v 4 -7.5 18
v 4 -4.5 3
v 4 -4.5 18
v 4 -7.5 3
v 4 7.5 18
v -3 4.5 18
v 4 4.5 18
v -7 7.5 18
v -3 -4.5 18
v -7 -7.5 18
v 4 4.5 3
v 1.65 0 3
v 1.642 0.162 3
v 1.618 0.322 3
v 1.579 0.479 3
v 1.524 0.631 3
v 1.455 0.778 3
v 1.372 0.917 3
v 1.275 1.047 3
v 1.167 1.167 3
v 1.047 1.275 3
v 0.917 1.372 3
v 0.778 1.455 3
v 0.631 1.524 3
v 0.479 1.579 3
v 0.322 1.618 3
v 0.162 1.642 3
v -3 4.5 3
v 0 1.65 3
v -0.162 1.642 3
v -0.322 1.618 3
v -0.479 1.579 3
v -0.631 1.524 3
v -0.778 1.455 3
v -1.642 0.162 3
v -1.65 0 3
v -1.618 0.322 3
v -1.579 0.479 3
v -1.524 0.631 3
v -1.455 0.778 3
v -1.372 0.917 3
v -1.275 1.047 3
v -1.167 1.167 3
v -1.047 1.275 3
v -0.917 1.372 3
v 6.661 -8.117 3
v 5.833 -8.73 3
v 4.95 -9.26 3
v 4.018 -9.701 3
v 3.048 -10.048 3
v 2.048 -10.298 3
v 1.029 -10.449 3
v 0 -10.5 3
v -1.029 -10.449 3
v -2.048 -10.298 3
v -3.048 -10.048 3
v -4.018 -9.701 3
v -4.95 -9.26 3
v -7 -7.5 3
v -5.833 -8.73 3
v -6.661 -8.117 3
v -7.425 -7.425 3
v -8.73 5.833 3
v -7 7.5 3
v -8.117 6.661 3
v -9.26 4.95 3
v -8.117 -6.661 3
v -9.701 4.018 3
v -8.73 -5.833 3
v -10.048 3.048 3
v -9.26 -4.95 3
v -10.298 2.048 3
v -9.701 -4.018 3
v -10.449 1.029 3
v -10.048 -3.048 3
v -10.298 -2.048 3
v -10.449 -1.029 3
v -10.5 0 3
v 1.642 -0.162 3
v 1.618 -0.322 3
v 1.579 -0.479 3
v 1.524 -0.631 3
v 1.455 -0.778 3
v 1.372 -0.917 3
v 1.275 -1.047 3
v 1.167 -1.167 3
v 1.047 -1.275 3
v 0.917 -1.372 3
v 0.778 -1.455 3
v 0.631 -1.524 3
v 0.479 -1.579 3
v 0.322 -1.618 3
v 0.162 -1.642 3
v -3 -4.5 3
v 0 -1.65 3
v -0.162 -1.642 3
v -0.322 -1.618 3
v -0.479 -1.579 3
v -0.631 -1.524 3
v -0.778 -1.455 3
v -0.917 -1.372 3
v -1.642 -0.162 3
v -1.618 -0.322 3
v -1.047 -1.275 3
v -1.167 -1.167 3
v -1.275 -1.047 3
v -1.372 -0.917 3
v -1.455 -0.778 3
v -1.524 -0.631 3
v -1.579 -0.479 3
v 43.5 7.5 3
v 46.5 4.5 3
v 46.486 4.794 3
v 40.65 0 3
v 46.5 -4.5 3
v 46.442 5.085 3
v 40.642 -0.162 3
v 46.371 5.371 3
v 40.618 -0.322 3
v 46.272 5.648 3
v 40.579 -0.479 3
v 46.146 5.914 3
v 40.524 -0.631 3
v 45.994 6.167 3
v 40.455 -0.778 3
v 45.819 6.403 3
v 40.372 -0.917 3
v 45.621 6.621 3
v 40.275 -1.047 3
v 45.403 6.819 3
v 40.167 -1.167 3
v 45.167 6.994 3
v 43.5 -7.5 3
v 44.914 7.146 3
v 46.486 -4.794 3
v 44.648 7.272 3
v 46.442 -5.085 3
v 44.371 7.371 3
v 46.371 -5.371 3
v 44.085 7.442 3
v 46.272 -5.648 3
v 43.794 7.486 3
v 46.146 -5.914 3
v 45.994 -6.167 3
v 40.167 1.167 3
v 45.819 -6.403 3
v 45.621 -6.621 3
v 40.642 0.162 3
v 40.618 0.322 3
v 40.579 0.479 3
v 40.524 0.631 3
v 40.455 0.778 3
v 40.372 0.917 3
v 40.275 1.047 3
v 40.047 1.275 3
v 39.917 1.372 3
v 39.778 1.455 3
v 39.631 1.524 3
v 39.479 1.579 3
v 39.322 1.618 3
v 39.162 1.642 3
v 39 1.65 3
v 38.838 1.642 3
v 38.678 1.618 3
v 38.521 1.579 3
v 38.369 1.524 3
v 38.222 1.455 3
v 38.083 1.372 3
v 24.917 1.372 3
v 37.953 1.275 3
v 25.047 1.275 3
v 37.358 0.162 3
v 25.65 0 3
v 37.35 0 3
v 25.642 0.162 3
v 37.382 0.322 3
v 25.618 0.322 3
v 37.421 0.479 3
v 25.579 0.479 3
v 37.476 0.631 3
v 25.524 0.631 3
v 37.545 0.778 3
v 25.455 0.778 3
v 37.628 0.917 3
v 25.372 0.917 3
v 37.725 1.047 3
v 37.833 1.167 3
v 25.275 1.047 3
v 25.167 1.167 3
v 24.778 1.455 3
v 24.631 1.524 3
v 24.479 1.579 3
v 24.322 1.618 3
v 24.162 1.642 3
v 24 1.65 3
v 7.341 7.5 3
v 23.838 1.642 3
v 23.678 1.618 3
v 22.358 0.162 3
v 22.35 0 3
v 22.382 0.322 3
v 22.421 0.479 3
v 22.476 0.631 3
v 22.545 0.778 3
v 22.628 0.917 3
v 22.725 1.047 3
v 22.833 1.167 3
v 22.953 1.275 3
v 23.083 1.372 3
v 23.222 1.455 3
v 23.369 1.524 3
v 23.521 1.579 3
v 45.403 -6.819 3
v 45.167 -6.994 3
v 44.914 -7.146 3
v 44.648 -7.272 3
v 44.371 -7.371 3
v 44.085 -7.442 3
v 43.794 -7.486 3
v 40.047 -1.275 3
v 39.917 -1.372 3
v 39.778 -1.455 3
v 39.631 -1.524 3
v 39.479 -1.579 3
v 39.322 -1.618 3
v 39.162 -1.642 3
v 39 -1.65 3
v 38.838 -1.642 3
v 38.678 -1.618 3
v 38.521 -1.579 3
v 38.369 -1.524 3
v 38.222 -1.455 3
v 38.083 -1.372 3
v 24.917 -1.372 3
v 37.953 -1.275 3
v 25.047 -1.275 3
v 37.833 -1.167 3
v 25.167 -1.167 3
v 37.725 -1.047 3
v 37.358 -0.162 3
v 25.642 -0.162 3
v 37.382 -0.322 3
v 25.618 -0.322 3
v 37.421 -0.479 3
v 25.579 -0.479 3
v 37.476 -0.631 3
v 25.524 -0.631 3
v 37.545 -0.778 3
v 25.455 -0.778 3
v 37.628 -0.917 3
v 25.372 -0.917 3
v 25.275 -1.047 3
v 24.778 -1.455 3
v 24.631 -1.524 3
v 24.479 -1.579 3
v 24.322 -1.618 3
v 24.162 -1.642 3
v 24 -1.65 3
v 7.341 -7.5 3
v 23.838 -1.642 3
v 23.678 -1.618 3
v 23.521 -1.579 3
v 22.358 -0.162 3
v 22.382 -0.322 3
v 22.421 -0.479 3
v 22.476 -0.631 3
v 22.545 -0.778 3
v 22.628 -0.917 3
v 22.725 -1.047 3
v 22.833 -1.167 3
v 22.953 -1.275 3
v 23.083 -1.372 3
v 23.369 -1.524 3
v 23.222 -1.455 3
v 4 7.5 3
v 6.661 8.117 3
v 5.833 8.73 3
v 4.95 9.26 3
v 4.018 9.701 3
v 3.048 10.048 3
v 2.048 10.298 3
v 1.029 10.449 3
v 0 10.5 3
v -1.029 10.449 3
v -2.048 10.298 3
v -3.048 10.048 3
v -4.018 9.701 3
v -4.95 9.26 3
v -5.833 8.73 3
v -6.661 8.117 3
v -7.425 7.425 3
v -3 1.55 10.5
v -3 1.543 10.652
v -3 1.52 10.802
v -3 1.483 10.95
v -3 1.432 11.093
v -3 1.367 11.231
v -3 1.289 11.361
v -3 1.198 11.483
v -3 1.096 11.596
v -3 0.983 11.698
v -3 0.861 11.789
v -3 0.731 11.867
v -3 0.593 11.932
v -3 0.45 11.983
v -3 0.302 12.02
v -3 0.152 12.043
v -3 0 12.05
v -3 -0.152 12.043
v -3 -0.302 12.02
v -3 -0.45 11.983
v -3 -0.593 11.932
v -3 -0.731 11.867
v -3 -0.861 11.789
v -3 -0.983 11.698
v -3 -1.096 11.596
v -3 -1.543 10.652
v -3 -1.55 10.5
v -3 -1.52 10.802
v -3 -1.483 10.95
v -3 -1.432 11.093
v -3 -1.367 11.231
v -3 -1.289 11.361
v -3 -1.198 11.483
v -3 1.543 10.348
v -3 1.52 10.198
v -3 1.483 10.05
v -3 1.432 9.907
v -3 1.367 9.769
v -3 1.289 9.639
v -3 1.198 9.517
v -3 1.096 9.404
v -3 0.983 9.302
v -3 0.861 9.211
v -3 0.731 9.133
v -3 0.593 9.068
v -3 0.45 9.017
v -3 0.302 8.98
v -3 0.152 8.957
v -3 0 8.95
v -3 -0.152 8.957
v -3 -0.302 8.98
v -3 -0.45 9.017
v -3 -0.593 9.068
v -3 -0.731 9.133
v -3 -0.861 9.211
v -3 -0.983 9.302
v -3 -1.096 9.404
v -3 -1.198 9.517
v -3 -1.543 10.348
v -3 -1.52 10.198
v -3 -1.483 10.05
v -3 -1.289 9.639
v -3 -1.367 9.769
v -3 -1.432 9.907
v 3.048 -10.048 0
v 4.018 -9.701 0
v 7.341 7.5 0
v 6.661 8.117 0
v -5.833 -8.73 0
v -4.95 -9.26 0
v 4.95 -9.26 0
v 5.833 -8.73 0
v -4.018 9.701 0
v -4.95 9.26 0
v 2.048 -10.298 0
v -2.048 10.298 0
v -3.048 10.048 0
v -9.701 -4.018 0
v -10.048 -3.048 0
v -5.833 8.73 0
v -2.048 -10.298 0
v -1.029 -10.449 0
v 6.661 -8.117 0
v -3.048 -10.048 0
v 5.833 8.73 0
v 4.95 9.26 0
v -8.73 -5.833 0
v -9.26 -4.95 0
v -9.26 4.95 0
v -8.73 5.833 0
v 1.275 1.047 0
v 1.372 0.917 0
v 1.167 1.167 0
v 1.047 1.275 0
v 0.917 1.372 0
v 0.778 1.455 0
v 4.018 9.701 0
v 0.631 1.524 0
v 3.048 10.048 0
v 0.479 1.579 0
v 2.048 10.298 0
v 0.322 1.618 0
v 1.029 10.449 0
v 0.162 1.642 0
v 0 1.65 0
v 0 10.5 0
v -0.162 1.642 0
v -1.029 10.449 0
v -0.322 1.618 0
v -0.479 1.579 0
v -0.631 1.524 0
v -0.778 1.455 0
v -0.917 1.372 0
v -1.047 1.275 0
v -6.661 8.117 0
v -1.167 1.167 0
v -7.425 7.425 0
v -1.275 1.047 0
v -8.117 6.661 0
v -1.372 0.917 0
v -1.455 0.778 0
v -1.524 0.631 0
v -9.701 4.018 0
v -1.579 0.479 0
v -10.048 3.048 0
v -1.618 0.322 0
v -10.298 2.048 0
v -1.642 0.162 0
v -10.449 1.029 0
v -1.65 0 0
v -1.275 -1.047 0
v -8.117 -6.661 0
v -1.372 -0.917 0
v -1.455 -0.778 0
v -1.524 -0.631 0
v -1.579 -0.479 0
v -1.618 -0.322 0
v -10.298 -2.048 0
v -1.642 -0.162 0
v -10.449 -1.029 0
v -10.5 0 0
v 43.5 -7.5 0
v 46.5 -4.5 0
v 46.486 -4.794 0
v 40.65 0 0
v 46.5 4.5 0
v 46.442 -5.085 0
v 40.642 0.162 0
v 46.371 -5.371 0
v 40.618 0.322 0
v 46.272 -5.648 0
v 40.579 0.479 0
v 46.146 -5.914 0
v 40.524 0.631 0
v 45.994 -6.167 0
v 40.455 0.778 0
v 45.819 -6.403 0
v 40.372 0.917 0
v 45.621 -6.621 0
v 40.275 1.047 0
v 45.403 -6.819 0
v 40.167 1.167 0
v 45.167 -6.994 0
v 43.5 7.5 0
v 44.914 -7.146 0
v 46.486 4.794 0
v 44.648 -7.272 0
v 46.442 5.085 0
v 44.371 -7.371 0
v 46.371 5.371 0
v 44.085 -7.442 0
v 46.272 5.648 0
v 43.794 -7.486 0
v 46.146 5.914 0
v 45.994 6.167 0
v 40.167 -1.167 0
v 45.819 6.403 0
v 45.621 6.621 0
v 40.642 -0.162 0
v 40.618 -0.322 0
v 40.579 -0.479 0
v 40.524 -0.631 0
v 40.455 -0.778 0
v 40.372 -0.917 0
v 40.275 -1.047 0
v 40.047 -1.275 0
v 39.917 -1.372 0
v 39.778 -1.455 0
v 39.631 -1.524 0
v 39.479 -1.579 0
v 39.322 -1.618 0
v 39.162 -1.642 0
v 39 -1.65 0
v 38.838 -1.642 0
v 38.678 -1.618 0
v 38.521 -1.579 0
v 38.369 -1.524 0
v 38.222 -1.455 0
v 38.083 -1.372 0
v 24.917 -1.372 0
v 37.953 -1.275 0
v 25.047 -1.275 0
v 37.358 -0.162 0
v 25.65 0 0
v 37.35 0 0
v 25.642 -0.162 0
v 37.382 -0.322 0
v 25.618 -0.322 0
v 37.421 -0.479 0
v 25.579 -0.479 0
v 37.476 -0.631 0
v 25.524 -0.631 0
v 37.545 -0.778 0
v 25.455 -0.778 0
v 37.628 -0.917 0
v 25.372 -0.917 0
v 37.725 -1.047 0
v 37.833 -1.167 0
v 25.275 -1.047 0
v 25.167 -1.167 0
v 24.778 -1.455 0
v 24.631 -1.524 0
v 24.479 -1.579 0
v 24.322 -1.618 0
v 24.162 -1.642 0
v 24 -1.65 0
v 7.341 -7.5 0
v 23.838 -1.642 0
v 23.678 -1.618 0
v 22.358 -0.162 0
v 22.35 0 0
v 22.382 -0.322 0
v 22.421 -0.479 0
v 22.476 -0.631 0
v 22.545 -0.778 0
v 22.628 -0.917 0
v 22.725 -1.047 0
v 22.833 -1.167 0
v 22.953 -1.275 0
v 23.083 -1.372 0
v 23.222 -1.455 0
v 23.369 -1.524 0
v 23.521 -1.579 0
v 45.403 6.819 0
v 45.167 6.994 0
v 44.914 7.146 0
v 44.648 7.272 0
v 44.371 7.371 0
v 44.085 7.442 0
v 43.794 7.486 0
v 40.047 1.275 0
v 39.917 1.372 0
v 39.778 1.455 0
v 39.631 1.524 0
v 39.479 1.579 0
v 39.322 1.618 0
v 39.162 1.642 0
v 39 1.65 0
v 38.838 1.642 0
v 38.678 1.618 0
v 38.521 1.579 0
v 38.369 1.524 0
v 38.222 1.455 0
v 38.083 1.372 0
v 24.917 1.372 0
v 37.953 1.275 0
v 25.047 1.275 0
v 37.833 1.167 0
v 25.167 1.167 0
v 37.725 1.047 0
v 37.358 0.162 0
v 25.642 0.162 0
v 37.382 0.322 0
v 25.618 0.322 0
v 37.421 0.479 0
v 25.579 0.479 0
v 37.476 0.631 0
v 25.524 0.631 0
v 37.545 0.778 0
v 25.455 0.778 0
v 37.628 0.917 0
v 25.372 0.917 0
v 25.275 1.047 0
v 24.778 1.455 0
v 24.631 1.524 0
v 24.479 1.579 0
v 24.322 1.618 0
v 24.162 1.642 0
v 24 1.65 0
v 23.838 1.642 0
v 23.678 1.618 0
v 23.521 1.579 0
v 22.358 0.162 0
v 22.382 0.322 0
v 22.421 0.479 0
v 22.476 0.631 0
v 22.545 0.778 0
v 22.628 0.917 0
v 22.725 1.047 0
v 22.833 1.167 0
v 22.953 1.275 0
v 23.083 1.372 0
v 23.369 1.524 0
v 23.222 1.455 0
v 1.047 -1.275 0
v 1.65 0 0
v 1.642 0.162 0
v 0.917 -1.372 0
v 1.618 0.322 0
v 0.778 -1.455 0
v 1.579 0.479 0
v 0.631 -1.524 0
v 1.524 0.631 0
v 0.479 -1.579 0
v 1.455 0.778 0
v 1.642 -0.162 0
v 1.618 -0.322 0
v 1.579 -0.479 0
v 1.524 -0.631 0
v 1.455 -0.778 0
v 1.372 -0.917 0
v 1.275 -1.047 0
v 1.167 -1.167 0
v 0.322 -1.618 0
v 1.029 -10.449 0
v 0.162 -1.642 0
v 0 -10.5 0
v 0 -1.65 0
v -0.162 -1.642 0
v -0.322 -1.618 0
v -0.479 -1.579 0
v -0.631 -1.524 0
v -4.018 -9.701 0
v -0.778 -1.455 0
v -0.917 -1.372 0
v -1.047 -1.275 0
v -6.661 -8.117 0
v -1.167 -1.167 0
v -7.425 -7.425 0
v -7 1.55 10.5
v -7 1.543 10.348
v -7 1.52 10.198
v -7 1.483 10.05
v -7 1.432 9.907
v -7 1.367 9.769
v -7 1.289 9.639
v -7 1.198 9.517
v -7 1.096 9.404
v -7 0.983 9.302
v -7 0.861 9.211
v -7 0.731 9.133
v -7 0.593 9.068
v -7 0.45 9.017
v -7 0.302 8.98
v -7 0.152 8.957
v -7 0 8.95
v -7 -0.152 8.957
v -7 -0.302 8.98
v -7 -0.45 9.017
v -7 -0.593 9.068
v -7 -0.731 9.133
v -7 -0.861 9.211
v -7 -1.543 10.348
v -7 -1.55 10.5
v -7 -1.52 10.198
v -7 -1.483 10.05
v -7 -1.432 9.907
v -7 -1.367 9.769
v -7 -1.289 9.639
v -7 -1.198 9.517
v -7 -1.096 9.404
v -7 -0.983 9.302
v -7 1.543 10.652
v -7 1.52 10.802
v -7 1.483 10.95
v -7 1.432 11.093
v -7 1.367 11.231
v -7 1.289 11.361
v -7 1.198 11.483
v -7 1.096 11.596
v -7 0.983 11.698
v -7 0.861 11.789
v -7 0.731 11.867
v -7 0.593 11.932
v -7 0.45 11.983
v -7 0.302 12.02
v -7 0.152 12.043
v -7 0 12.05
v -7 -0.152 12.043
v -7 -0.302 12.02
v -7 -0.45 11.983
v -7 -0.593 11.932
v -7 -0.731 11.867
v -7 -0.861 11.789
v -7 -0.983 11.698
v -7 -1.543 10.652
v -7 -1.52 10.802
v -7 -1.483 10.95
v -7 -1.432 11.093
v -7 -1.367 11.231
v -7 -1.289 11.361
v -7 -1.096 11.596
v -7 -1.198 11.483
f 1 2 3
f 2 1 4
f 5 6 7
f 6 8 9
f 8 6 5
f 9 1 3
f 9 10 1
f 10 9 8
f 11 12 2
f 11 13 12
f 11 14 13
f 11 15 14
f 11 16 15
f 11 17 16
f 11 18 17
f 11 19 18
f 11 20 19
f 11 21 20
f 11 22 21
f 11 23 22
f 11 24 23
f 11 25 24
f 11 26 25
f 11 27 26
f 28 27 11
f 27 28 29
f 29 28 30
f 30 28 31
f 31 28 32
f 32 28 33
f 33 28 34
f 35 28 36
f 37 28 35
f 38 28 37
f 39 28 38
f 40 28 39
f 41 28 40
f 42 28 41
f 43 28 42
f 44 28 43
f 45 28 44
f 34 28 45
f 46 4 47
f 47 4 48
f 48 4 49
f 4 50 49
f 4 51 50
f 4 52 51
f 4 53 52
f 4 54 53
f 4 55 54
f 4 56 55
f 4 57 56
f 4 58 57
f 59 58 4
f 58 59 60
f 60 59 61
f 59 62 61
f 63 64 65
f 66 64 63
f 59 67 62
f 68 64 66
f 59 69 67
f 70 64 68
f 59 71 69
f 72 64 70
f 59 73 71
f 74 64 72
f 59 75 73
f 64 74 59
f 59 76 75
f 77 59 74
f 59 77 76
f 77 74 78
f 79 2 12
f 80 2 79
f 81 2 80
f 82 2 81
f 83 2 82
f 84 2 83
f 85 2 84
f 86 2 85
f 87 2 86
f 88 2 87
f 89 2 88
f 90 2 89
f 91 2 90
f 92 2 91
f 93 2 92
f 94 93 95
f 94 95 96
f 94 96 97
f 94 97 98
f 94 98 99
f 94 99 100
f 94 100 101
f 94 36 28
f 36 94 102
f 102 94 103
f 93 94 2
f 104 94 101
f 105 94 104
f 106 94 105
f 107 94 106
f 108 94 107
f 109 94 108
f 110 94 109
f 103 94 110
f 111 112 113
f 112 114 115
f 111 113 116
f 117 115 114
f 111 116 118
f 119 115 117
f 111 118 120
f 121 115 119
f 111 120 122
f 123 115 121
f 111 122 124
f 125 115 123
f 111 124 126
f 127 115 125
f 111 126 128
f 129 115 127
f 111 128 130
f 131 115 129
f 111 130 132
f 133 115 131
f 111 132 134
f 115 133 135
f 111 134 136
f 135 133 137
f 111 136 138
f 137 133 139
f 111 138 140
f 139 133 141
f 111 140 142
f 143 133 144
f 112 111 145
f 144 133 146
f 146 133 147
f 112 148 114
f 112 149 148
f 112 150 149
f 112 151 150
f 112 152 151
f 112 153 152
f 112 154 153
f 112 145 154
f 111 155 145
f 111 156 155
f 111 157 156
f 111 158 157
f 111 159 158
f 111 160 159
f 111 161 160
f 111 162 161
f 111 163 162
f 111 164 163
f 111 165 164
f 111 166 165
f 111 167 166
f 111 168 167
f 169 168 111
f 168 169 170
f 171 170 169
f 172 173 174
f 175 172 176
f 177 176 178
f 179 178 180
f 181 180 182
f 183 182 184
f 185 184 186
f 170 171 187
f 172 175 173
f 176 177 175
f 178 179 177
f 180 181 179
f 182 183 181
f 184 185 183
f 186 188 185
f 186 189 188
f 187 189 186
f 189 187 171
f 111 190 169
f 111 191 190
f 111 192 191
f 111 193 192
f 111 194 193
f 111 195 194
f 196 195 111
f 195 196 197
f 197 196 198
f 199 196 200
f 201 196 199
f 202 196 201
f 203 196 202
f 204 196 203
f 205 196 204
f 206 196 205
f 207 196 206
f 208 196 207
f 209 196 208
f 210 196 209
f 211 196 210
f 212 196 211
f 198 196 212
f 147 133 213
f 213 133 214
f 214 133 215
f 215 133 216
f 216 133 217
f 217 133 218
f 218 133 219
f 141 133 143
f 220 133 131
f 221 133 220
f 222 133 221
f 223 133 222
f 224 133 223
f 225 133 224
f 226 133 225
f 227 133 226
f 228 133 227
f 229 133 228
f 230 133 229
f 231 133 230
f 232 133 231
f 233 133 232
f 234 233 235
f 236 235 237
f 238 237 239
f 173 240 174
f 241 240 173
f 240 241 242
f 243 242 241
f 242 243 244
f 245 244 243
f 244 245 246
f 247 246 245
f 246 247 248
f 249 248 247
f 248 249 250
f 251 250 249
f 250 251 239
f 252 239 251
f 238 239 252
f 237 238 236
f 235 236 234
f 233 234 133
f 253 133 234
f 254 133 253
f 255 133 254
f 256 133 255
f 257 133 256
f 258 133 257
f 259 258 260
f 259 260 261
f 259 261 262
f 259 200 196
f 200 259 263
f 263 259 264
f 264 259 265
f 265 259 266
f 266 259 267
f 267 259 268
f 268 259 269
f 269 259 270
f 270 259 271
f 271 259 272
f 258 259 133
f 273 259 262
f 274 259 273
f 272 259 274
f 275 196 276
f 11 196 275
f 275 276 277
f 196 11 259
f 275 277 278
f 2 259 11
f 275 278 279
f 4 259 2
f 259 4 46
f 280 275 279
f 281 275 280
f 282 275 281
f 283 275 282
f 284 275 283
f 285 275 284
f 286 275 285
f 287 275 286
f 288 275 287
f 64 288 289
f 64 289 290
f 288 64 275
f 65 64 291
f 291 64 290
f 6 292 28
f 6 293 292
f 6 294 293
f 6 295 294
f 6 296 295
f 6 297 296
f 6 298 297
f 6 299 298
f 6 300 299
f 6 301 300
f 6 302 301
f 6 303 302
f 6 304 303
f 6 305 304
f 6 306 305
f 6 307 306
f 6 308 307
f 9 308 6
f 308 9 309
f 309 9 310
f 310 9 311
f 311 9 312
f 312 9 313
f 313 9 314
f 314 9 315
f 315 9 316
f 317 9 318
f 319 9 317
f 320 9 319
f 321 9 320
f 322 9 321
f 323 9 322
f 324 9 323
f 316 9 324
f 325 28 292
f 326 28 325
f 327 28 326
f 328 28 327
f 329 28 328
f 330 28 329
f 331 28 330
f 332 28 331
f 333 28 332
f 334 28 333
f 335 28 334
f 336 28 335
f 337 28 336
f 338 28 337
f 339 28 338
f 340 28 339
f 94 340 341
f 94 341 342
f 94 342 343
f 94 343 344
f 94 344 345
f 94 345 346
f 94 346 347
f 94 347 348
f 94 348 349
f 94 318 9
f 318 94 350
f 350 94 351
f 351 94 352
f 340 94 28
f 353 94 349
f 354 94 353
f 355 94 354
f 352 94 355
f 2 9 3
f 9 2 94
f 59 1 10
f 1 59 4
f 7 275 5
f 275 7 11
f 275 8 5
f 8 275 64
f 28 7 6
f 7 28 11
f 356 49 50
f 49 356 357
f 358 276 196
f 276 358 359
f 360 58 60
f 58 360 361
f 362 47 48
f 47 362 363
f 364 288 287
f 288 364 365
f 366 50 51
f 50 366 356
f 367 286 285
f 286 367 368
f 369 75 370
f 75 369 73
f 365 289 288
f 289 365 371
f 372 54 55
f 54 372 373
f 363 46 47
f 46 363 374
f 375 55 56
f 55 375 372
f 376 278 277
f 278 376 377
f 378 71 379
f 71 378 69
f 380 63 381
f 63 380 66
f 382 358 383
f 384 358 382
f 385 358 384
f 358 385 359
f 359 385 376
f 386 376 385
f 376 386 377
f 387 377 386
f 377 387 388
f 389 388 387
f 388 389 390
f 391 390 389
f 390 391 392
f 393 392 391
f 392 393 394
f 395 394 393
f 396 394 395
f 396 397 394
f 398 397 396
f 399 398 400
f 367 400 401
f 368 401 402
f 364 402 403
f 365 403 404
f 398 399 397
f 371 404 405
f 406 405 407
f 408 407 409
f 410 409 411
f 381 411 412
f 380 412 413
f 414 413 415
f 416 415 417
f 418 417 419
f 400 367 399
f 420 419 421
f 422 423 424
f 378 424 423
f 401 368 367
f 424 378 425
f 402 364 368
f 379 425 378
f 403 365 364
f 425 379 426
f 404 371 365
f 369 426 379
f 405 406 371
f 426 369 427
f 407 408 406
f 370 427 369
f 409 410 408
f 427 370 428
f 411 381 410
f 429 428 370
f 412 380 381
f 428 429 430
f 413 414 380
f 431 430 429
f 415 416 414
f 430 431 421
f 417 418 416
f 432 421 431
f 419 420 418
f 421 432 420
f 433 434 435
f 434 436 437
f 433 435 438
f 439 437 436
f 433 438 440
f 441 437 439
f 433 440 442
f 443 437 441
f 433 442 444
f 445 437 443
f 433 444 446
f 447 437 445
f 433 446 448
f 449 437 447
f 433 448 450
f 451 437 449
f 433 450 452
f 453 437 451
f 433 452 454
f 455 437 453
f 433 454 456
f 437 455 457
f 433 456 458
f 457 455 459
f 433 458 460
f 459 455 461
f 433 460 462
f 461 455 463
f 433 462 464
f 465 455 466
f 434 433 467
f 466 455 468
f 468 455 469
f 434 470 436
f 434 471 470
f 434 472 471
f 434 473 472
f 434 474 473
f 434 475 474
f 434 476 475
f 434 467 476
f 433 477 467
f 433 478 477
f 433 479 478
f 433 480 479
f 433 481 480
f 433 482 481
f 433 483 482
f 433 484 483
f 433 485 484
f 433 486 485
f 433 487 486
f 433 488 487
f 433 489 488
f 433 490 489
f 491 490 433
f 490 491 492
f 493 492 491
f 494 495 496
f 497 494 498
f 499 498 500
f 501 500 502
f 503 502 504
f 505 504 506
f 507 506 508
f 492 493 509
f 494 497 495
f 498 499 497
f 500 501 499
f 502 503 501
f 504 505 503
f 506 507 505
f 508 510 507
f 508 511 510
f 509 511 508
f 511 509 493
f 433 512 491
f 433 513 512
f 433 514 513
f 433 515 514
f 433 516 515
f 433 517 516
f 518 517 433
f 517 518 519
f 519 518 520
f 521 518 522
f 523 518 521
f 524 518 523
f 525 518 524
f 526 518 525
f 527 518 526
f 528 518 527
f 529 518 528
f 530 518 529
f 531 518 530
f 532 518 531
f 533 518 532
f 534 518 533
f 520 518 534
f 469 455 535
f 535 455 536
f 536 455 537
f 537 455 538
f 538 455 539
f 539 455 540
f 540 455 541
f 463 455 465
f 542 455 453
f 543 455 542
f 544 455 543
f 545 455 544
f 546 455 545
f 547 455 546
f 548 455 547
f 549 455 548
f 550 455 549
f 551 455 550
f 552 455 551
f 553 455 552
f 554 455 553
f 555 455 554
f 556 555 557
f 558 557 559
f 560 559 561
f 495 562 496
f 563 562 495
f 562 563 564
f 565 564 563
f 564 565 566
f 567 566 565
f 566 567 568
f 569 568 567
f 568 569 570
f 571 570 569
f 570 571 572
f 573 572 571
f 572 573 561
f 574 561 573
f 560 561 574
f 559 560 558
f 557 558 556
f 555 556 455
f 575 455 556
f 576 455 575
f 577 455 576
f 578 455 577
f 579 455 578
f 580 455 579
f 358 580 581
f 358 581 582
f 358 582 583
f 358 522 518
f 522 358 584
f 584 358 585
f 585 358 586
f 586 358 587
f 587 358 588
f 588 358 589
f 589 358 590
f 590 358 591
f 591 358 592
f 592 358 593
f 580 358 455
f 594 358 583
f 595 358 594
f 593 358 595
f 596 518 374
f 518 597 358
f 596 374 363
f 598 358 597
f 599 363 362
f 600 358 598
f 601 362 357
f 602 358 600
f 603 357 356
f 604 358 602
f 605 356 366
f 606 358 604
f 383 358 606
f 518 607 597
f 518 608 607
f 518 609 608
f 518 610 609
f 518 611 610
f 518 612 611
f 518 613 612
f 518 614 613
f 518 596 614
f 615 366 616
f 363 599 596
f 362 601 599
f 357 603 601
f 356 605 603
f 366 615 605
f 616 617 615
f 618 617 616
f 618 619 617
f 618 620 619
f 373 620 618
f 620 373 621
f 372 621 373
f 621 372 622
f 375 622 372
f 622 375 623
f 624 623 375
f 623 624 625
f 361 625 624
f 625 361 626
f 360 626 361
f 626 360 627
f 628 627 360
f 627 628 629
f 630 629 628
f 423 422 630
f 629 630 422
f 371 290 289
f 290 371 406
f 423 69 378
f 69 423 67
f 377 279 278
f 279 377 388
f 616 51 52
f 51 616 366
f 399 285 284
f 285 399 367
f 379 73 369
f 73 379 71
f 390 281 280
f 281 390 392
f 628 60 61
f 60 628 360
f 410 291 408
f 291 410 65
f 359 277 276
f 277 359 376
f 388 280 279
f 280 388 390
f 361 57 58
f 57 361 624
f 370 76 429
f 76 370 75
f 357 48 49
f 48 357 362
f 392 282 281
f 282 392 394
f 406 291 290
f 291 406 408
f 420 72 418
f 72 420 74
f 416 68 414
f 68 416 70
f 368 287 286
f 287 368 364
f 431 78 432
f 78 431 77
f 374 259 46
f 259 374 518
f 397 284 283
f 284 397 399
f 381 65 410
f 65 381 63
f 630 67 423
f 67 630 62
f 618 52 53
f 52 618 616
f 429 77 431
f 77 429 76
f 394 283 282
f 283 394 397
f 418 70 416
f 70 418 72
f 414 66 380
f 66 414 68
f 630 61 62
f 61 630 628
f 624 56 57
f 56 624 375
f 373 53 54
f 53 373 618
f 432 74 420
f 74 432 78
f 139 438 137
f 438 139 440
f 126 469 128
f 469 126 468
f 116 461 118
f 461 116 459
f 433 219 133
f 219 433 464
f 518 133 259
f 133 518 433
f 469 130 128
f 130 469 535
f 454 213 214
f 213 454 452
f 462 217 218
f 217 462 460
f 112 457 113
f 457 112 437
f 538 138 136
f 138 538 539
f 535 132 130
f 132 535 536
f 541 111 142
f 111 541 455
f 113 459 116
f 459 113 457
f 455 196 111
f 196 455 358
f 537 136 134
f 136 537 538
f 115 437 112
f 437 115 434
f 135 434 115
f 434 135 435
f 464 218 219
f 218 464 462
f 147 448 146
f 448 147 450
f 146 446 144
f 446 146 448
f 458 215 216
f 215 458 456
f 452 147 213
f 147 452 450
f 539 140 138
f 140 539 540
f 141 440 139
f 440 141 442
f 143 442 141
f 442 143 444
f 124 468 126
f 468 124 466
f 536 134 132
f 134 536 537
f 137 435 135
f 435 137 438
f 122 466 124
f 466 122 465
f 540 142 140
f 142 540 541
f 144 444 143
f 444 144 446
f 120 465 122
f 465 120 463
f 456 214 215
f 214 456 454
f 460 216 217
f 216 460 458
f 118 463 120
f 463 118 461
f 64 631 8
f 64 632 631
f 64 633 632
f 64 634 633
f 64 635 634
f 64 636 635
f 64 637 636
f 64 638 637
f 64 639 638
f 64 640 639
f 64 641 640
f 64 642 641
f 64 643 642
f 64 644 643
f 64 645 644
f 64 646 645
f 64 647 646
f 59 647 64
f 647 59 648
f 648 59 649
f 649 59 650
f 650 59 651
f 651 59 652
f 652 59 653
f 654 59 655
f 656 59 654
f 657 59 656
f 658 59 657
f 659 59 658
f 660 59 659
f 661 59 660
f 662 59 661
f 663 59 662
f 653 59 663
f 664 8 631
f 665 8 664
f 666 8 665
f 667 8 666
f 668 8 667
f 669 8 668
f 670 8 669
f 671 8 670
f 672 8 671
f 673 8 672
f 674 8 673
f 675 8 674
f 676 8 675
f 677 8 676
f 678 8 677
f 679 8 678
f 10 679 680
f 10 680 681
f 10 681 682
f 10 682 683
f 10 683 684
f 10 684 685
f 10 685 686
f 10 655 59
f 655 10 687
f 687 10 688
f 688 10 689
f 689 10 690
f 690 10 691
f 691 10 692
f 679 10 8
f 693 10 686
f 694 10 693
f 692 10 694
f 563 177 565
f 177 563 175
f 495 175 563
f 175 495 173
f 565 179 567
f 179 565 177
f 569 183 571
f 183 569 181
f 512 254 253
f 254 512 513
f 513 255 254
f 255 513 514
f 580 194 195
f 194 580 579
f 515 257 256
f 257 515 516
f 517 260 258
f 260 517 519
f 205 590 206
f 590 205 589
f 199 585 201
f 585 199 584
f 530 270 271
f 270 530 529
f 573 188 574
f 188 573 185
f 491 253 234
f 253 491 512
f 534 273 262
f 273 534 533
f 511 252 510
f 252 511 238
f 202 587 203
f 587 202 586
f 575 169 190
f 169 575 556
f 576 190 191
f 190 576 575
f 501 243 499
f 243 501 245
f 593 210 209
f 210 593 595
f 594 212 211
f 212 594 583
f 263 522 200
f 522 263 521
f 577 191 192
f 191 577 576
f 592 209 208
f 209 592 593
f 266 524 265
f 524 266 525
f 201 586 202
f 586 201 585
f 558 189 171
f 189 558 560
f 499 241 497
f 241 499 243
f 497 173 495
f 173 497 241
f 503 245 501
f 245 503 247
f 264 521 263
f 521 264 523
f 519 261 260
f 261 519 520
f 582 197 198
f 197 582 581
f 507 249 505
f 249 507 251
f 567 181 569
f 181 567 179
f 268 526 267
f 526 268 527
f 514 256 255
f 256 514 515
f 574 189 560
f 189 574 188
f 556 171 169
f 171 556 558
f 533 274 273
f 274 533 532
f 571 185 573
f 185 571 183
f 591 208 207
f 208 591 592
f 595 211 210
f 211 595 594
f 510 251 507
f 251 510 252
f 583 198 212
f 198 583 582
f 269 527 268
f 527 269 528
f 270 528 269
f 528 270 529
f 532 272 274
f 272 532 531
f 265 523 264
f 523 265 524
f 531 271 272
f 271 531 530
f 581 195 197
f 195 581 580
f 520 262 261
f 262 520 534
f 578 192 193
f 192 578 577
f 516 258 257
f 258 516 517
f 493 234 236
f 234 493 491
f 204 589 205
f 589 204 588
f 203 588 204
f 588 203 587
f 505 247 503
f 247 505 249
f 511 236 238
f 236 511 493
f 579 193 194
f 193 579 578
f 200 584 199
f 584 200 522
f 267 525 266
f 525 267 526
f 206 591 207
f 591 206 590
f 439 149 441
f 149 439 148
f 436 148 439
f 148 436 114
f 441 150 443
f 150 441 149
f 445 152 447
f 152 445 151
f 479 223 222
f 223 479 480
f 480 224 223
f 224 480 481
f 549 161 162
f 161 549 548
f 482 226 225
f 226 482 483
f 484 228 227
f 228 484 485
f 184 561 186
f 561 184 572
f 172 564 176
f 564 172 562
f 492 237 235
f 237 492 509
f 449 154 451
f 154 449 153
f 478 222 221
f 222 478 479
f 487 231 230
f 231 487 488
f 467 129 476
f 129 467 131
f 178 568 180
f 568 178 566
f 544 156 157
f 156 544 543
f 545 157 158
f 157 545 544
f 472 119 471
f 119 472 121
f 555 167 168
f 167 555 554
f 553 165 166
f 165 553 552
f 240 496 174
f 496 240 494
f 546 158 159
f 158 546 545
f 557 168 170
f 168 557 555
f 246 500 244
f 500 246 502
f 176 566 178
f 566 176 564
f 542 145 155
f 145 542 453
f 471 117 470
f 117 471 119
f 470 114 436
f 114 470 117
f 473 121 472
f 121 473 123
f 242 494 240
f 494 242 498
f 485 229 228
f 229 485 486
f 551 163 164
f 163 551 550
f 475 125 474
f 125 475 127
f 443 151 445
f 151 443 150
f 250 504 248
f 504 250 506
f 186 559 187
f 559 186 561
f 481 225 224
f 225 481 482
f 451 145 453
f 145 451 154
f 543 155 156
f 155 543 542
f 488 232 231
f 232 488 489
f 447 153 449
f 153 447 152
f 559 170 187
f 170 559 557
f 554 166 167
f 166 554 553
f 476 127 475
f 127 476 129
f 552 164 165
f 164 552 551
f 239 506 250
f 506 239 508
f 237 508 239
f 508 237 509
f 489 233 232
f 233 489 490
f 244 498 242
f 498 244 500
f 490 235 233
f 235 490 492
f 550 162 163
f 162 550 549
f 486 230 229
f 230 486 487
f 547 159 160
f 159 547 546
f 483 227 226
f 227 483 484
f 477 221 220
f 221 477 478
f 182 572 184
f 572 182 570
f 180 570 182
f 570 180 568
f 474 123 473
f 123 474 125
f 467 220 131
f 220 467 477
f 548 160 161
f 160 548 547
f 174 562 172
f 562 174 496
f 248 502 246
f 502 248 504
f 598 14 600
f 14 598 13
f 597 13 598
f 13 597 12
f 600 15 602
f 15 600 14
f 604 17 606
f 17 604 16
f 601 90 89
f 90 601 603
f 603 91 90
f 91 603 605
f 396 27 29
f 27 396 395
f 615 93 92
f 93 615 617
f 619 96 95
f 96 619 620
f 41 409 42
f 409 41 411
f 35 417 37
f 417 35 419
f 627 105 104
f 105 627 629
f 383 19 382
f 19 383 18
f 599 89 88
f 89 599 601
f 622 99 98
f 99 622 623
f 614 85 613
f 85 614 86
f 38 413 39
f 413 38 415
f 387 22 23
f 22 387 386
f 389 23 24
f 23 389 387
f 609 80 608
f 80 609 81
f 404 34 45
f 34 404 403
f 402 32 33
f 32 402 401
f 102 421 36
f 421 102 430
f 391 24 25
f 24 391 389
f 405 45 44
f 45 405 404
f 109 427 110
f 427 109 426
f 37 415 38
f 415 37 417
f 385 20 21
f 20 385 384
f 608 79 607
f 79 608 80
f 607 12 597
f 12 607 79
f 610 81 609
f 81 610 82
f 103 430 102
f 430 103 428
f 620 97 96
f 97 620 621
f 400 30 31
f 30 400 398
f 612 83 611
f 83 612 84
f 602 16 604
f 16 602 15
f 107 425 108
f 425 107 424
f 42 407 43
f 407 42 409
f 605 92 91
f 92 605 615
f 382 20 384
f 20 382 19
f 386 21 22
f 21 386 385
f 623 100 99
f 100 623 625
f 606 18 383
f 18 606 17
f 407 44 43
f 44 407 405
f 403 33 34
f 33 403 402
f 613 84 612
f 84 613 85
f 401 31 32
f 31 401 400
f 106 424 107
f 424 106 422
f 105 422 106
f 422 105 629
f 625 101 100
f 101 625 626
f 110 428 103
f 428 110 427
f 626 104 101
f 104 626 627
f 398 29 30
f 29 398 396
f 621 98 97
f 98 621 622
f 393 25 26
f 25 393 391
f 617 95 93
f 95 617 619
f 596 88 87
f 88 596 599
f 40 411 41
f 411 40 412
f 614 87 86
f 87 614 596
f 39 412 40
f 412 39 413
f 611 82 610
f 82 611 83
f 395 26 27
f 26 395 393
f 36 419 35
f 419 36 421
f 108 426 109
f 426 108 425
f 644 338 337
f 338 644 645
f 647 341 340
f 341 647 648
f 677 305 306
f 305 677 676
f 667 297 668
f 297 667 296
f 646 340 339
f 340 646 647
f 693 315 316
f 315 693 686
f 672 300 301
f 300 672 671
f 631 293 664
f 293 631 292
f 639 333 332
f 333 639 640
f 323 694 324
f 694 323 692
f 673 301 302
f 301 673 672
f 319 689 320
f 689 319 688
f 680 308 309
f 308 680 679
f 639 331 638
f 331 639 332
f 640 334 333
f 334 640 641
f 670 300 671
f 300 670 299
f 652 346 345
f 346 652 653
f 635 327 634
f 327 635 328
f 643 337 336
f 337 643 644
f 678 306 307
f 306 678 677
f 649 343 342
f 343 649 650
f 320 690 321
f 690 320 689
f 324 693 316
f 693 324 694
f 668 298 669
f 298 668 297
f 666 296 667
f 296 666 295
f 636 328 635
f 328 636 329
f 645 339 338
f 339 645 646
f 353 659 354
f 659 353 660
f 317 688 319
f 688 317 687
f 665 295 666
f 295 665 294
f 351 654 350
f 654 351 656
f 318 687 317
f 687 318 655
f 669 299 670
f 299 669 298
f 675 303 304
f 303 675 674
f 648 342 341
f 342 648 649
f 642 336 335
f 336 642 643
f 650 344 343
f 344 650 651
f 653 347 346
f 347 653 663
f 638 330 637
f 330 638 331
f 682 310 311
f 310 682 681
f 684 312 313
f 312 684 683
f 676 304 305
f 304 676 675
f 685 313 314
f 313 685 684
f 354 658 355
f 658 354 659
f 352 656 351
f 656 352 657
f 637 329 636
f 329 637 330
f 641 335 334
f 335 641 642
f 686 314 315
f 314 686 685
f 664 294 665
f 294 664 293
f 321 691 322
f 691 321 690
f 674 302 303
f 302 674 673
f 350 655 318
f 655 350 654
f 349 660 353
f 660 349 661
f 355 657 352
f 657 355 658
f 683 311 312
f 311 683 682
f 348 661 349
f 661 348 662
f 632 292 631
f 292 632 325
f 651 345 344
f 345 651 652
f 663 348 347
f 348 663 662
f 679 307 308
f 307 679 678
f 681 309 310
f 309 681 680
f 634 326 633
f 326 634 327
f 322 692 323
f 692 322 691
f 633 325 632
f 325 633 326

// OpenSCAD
// Simple end for a Kossel brace using OpenBeam parts in an X shape
brace_circle_dia = 21; // mm
brace_circle_r = brace_circle_dia / 2;
hole_dia = 3.0 + 0.3; //mm
hole_r = hole_dia / 2;
thickness = 3;
centerhole_to_ob_edge = 16.5; // calculated from (diagonal - gap) / 2
rect_len = centerhole_to_ob_edge + 30;
ob_edge_hole_offset = 7.5;  //mm, offset from edge of OpenBeam to first hole
rect_width = 15; //mm
delta = 10; //mm
rect_fillet_r = 3;
ob_width = 15;
backstop_thickness = 4; //mm
backstop_width = ob_width; //mm
backstop_offset = 3; // offset from center hole to face of backstop
backstop_rim_width = 3;  // side width
backstop_rim_offset = backstop_width / 2 - backstop_rim_width / 2;
backstop_rim_len = 7;
big = 1000;

$fn=64;

difference() {
	union() {
		// Main circle
		cylinder(r=brace_circle_r, h=thickness);
		// Extension
		//translate([0, -rect_width/2, 0]) cube([rect_len, rect_width, thickness]);
		translate([rect_fillet_r, -rect_width/2 + rect_fillet_r, 0]) minkowski()
		{
			cube([rect_len - 2 * rect_fillet_r,rect_width - 2 * rect_fillet_r, thickness/2]);
			cylinder(r=rect_fillet_r,h=thickness/2);
		}
		// Backstop for tensioning
		translate([-backstop_thickness - backstop_offset, -backstop_width/2, thickness]) cube([backstop_thickness, backstop_width, ob_width]);
		// Sides of backstop
		for (i = [-1, 1]) {
			translate([-backstop_offset, i * backstop_rim_offset - backstop_rim_width/2, thickness]) cube([backstop_rim_len, backstop_rim_width, ob_width]);			
		}
	}
	// Holes
	// Center hole
	cylinder(r=hole_r, h=thickness + delta * 2, center=true);
	// Holes for attaching brace to OpenBeam
	for (i = [0, 15]) {
		translate([centerhole_to_ob_edge + i + ob_edge_hole_offset, 0, 0]) cylinder(r=hole_r, h=thickness + 2 * delta, center=true);	
	}
	// Backstop hole
	translate([-big/2, 0, thickness + ob_width / 2]) rotate([0, 90, 0]) cylinder(r=hole_r - 0.1, h = big);
}
